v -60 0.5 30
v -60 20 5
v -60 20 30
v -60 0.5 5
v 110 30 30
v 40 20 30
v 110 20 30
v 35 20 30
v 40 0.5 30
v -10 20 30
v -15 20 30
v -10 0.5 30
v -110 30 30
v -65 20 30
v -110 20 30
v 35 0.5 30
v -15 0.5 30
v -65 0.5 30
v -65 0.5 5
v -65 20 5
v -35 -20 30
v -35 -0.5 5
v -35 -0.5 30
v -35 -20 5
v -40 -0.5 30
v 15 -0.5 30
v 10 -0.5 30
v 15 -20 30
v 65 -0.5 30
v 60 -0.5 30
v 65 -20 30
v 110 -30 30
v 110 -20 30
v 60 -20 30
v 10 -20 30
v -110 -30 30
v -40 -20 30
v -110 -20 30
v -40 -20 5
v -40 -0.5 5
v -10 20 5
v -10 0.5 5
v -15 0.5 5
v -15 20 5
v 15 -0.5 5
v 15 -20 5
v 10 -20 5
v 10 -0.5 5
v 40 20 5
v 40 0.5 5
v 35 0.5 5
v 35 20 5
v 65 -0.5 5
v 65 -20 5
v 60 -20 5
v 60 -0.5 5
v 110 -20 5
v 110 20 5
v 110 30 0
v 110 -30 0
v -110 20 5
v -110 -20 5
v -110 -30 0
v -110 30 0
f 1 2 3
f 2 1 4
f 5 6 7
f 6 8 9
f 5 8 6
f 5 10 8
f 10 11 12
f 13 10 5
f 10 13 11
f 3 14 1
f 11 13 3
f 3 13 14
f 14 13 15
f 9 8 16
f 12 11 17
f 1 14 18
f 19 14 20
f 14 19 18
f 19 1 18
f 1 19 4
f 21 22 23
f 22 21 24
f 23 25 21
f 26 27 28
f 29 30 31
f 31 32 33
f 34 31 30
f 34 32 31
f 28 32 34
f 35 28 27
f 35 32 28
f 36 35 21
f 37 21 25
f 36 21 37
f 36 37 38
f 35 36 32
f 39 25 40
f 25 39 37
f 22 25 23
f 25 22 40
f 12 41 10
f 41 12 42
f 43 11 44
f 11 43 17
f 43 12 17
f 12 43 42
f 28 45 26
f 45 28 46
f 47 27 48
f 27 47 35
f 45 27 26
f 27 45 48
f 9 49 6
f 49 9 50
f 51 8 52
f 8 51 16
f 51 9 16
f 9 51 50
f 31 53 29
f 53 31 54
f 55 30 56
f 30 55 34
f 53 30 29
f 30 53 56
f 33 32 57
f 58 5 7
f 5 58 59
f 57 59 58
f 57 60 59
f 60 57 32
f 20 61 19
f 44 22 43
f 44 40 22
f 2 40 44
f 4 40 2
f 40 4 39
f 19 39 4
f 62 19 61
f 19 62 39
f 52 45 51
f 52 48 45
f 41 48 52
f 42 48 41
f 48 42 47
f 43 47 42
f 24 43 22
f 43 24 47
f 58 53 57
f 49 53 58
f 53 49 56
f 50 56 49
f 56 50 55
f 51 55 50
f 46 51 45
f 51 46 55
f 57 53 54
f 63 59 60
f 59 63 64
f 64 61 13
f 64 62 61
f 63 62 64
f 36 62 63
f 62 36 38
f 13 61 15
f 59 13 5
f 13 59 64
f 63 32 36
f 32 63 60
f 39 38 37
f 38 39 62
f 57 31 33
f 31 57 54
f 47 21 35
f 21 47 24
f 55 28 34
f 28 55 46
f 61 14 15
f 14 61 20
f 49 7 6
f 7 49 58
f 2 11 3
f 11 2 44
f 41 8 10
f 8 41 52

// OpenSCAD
$fn = 32;

// ----------------------------------------------------------------------
// Rib frame 220 x 60 x 30
// 6 ribs at 25 mm pitch, staggered
// ----------------------------------------------------------------------

// --- parameters (mm) ---
frame = [220, 60, 5];  // base plate size (x, y, z)
rail_w = 10;           // side rail width
ribs = 6;              // number of ribs
rib_t = 5;             // rib thickness
rib_h = 25;            // rib height above the base plate
pitch = 25;            // pitch between rib centres

// --- derived feature positions (mm) ---
span = (ribs - 1) * pitch;          // = 125   distance between the outer ribs
origin_x = -span / 2;               // = -62.5   X of the first rib
rib_len = frame[1] / 2 - rail_w + 0.5;  // = 20.5   length of a staggered rib
rib_y = 0.5 + rib_len / 2;          // = 10.75   Y of a staggered rib centre
row_offset = 2 * rib_y;             // = 21.5   distance between the two rows
feature_centers = [
  [origin_x + 0 * pitch, rib_y],
  [origin_x + 1 * pitch, -rib_y],
  [origin_x + 2 * pitch, rib_y],
  [origin_x + 3 * pitch, -rib_y],
  [origin_x + 4 * pitch, rib_y],
  [origin_x + 5 * pitch, -rib_y]
];   // rib centre line, drives the rib loop

// base plate, two side rails, then the ribs read straight off feature_centers
union() {
  translate([-frame[0] / 2, -frame[1] / 2, 0]) cube(frame);
  translate([-frame[0] / 2, -frame[1] / 2, 0]) cube([frame[0], rail_w, frame[2] + rib_h]);
  translate([-frame[0] / 2, frame[1] / 2 - rail_w, 0]) cube([frame[0], rail_w, frame[2] + rib_h]);
  for (centre = feature_centers)
    translate([centre[0] - rib_t / 2, centre[1] - rib_len / 2, frame[2] - 1])
      cube([rib_t, rib_len, rib_h + 1]);
}
